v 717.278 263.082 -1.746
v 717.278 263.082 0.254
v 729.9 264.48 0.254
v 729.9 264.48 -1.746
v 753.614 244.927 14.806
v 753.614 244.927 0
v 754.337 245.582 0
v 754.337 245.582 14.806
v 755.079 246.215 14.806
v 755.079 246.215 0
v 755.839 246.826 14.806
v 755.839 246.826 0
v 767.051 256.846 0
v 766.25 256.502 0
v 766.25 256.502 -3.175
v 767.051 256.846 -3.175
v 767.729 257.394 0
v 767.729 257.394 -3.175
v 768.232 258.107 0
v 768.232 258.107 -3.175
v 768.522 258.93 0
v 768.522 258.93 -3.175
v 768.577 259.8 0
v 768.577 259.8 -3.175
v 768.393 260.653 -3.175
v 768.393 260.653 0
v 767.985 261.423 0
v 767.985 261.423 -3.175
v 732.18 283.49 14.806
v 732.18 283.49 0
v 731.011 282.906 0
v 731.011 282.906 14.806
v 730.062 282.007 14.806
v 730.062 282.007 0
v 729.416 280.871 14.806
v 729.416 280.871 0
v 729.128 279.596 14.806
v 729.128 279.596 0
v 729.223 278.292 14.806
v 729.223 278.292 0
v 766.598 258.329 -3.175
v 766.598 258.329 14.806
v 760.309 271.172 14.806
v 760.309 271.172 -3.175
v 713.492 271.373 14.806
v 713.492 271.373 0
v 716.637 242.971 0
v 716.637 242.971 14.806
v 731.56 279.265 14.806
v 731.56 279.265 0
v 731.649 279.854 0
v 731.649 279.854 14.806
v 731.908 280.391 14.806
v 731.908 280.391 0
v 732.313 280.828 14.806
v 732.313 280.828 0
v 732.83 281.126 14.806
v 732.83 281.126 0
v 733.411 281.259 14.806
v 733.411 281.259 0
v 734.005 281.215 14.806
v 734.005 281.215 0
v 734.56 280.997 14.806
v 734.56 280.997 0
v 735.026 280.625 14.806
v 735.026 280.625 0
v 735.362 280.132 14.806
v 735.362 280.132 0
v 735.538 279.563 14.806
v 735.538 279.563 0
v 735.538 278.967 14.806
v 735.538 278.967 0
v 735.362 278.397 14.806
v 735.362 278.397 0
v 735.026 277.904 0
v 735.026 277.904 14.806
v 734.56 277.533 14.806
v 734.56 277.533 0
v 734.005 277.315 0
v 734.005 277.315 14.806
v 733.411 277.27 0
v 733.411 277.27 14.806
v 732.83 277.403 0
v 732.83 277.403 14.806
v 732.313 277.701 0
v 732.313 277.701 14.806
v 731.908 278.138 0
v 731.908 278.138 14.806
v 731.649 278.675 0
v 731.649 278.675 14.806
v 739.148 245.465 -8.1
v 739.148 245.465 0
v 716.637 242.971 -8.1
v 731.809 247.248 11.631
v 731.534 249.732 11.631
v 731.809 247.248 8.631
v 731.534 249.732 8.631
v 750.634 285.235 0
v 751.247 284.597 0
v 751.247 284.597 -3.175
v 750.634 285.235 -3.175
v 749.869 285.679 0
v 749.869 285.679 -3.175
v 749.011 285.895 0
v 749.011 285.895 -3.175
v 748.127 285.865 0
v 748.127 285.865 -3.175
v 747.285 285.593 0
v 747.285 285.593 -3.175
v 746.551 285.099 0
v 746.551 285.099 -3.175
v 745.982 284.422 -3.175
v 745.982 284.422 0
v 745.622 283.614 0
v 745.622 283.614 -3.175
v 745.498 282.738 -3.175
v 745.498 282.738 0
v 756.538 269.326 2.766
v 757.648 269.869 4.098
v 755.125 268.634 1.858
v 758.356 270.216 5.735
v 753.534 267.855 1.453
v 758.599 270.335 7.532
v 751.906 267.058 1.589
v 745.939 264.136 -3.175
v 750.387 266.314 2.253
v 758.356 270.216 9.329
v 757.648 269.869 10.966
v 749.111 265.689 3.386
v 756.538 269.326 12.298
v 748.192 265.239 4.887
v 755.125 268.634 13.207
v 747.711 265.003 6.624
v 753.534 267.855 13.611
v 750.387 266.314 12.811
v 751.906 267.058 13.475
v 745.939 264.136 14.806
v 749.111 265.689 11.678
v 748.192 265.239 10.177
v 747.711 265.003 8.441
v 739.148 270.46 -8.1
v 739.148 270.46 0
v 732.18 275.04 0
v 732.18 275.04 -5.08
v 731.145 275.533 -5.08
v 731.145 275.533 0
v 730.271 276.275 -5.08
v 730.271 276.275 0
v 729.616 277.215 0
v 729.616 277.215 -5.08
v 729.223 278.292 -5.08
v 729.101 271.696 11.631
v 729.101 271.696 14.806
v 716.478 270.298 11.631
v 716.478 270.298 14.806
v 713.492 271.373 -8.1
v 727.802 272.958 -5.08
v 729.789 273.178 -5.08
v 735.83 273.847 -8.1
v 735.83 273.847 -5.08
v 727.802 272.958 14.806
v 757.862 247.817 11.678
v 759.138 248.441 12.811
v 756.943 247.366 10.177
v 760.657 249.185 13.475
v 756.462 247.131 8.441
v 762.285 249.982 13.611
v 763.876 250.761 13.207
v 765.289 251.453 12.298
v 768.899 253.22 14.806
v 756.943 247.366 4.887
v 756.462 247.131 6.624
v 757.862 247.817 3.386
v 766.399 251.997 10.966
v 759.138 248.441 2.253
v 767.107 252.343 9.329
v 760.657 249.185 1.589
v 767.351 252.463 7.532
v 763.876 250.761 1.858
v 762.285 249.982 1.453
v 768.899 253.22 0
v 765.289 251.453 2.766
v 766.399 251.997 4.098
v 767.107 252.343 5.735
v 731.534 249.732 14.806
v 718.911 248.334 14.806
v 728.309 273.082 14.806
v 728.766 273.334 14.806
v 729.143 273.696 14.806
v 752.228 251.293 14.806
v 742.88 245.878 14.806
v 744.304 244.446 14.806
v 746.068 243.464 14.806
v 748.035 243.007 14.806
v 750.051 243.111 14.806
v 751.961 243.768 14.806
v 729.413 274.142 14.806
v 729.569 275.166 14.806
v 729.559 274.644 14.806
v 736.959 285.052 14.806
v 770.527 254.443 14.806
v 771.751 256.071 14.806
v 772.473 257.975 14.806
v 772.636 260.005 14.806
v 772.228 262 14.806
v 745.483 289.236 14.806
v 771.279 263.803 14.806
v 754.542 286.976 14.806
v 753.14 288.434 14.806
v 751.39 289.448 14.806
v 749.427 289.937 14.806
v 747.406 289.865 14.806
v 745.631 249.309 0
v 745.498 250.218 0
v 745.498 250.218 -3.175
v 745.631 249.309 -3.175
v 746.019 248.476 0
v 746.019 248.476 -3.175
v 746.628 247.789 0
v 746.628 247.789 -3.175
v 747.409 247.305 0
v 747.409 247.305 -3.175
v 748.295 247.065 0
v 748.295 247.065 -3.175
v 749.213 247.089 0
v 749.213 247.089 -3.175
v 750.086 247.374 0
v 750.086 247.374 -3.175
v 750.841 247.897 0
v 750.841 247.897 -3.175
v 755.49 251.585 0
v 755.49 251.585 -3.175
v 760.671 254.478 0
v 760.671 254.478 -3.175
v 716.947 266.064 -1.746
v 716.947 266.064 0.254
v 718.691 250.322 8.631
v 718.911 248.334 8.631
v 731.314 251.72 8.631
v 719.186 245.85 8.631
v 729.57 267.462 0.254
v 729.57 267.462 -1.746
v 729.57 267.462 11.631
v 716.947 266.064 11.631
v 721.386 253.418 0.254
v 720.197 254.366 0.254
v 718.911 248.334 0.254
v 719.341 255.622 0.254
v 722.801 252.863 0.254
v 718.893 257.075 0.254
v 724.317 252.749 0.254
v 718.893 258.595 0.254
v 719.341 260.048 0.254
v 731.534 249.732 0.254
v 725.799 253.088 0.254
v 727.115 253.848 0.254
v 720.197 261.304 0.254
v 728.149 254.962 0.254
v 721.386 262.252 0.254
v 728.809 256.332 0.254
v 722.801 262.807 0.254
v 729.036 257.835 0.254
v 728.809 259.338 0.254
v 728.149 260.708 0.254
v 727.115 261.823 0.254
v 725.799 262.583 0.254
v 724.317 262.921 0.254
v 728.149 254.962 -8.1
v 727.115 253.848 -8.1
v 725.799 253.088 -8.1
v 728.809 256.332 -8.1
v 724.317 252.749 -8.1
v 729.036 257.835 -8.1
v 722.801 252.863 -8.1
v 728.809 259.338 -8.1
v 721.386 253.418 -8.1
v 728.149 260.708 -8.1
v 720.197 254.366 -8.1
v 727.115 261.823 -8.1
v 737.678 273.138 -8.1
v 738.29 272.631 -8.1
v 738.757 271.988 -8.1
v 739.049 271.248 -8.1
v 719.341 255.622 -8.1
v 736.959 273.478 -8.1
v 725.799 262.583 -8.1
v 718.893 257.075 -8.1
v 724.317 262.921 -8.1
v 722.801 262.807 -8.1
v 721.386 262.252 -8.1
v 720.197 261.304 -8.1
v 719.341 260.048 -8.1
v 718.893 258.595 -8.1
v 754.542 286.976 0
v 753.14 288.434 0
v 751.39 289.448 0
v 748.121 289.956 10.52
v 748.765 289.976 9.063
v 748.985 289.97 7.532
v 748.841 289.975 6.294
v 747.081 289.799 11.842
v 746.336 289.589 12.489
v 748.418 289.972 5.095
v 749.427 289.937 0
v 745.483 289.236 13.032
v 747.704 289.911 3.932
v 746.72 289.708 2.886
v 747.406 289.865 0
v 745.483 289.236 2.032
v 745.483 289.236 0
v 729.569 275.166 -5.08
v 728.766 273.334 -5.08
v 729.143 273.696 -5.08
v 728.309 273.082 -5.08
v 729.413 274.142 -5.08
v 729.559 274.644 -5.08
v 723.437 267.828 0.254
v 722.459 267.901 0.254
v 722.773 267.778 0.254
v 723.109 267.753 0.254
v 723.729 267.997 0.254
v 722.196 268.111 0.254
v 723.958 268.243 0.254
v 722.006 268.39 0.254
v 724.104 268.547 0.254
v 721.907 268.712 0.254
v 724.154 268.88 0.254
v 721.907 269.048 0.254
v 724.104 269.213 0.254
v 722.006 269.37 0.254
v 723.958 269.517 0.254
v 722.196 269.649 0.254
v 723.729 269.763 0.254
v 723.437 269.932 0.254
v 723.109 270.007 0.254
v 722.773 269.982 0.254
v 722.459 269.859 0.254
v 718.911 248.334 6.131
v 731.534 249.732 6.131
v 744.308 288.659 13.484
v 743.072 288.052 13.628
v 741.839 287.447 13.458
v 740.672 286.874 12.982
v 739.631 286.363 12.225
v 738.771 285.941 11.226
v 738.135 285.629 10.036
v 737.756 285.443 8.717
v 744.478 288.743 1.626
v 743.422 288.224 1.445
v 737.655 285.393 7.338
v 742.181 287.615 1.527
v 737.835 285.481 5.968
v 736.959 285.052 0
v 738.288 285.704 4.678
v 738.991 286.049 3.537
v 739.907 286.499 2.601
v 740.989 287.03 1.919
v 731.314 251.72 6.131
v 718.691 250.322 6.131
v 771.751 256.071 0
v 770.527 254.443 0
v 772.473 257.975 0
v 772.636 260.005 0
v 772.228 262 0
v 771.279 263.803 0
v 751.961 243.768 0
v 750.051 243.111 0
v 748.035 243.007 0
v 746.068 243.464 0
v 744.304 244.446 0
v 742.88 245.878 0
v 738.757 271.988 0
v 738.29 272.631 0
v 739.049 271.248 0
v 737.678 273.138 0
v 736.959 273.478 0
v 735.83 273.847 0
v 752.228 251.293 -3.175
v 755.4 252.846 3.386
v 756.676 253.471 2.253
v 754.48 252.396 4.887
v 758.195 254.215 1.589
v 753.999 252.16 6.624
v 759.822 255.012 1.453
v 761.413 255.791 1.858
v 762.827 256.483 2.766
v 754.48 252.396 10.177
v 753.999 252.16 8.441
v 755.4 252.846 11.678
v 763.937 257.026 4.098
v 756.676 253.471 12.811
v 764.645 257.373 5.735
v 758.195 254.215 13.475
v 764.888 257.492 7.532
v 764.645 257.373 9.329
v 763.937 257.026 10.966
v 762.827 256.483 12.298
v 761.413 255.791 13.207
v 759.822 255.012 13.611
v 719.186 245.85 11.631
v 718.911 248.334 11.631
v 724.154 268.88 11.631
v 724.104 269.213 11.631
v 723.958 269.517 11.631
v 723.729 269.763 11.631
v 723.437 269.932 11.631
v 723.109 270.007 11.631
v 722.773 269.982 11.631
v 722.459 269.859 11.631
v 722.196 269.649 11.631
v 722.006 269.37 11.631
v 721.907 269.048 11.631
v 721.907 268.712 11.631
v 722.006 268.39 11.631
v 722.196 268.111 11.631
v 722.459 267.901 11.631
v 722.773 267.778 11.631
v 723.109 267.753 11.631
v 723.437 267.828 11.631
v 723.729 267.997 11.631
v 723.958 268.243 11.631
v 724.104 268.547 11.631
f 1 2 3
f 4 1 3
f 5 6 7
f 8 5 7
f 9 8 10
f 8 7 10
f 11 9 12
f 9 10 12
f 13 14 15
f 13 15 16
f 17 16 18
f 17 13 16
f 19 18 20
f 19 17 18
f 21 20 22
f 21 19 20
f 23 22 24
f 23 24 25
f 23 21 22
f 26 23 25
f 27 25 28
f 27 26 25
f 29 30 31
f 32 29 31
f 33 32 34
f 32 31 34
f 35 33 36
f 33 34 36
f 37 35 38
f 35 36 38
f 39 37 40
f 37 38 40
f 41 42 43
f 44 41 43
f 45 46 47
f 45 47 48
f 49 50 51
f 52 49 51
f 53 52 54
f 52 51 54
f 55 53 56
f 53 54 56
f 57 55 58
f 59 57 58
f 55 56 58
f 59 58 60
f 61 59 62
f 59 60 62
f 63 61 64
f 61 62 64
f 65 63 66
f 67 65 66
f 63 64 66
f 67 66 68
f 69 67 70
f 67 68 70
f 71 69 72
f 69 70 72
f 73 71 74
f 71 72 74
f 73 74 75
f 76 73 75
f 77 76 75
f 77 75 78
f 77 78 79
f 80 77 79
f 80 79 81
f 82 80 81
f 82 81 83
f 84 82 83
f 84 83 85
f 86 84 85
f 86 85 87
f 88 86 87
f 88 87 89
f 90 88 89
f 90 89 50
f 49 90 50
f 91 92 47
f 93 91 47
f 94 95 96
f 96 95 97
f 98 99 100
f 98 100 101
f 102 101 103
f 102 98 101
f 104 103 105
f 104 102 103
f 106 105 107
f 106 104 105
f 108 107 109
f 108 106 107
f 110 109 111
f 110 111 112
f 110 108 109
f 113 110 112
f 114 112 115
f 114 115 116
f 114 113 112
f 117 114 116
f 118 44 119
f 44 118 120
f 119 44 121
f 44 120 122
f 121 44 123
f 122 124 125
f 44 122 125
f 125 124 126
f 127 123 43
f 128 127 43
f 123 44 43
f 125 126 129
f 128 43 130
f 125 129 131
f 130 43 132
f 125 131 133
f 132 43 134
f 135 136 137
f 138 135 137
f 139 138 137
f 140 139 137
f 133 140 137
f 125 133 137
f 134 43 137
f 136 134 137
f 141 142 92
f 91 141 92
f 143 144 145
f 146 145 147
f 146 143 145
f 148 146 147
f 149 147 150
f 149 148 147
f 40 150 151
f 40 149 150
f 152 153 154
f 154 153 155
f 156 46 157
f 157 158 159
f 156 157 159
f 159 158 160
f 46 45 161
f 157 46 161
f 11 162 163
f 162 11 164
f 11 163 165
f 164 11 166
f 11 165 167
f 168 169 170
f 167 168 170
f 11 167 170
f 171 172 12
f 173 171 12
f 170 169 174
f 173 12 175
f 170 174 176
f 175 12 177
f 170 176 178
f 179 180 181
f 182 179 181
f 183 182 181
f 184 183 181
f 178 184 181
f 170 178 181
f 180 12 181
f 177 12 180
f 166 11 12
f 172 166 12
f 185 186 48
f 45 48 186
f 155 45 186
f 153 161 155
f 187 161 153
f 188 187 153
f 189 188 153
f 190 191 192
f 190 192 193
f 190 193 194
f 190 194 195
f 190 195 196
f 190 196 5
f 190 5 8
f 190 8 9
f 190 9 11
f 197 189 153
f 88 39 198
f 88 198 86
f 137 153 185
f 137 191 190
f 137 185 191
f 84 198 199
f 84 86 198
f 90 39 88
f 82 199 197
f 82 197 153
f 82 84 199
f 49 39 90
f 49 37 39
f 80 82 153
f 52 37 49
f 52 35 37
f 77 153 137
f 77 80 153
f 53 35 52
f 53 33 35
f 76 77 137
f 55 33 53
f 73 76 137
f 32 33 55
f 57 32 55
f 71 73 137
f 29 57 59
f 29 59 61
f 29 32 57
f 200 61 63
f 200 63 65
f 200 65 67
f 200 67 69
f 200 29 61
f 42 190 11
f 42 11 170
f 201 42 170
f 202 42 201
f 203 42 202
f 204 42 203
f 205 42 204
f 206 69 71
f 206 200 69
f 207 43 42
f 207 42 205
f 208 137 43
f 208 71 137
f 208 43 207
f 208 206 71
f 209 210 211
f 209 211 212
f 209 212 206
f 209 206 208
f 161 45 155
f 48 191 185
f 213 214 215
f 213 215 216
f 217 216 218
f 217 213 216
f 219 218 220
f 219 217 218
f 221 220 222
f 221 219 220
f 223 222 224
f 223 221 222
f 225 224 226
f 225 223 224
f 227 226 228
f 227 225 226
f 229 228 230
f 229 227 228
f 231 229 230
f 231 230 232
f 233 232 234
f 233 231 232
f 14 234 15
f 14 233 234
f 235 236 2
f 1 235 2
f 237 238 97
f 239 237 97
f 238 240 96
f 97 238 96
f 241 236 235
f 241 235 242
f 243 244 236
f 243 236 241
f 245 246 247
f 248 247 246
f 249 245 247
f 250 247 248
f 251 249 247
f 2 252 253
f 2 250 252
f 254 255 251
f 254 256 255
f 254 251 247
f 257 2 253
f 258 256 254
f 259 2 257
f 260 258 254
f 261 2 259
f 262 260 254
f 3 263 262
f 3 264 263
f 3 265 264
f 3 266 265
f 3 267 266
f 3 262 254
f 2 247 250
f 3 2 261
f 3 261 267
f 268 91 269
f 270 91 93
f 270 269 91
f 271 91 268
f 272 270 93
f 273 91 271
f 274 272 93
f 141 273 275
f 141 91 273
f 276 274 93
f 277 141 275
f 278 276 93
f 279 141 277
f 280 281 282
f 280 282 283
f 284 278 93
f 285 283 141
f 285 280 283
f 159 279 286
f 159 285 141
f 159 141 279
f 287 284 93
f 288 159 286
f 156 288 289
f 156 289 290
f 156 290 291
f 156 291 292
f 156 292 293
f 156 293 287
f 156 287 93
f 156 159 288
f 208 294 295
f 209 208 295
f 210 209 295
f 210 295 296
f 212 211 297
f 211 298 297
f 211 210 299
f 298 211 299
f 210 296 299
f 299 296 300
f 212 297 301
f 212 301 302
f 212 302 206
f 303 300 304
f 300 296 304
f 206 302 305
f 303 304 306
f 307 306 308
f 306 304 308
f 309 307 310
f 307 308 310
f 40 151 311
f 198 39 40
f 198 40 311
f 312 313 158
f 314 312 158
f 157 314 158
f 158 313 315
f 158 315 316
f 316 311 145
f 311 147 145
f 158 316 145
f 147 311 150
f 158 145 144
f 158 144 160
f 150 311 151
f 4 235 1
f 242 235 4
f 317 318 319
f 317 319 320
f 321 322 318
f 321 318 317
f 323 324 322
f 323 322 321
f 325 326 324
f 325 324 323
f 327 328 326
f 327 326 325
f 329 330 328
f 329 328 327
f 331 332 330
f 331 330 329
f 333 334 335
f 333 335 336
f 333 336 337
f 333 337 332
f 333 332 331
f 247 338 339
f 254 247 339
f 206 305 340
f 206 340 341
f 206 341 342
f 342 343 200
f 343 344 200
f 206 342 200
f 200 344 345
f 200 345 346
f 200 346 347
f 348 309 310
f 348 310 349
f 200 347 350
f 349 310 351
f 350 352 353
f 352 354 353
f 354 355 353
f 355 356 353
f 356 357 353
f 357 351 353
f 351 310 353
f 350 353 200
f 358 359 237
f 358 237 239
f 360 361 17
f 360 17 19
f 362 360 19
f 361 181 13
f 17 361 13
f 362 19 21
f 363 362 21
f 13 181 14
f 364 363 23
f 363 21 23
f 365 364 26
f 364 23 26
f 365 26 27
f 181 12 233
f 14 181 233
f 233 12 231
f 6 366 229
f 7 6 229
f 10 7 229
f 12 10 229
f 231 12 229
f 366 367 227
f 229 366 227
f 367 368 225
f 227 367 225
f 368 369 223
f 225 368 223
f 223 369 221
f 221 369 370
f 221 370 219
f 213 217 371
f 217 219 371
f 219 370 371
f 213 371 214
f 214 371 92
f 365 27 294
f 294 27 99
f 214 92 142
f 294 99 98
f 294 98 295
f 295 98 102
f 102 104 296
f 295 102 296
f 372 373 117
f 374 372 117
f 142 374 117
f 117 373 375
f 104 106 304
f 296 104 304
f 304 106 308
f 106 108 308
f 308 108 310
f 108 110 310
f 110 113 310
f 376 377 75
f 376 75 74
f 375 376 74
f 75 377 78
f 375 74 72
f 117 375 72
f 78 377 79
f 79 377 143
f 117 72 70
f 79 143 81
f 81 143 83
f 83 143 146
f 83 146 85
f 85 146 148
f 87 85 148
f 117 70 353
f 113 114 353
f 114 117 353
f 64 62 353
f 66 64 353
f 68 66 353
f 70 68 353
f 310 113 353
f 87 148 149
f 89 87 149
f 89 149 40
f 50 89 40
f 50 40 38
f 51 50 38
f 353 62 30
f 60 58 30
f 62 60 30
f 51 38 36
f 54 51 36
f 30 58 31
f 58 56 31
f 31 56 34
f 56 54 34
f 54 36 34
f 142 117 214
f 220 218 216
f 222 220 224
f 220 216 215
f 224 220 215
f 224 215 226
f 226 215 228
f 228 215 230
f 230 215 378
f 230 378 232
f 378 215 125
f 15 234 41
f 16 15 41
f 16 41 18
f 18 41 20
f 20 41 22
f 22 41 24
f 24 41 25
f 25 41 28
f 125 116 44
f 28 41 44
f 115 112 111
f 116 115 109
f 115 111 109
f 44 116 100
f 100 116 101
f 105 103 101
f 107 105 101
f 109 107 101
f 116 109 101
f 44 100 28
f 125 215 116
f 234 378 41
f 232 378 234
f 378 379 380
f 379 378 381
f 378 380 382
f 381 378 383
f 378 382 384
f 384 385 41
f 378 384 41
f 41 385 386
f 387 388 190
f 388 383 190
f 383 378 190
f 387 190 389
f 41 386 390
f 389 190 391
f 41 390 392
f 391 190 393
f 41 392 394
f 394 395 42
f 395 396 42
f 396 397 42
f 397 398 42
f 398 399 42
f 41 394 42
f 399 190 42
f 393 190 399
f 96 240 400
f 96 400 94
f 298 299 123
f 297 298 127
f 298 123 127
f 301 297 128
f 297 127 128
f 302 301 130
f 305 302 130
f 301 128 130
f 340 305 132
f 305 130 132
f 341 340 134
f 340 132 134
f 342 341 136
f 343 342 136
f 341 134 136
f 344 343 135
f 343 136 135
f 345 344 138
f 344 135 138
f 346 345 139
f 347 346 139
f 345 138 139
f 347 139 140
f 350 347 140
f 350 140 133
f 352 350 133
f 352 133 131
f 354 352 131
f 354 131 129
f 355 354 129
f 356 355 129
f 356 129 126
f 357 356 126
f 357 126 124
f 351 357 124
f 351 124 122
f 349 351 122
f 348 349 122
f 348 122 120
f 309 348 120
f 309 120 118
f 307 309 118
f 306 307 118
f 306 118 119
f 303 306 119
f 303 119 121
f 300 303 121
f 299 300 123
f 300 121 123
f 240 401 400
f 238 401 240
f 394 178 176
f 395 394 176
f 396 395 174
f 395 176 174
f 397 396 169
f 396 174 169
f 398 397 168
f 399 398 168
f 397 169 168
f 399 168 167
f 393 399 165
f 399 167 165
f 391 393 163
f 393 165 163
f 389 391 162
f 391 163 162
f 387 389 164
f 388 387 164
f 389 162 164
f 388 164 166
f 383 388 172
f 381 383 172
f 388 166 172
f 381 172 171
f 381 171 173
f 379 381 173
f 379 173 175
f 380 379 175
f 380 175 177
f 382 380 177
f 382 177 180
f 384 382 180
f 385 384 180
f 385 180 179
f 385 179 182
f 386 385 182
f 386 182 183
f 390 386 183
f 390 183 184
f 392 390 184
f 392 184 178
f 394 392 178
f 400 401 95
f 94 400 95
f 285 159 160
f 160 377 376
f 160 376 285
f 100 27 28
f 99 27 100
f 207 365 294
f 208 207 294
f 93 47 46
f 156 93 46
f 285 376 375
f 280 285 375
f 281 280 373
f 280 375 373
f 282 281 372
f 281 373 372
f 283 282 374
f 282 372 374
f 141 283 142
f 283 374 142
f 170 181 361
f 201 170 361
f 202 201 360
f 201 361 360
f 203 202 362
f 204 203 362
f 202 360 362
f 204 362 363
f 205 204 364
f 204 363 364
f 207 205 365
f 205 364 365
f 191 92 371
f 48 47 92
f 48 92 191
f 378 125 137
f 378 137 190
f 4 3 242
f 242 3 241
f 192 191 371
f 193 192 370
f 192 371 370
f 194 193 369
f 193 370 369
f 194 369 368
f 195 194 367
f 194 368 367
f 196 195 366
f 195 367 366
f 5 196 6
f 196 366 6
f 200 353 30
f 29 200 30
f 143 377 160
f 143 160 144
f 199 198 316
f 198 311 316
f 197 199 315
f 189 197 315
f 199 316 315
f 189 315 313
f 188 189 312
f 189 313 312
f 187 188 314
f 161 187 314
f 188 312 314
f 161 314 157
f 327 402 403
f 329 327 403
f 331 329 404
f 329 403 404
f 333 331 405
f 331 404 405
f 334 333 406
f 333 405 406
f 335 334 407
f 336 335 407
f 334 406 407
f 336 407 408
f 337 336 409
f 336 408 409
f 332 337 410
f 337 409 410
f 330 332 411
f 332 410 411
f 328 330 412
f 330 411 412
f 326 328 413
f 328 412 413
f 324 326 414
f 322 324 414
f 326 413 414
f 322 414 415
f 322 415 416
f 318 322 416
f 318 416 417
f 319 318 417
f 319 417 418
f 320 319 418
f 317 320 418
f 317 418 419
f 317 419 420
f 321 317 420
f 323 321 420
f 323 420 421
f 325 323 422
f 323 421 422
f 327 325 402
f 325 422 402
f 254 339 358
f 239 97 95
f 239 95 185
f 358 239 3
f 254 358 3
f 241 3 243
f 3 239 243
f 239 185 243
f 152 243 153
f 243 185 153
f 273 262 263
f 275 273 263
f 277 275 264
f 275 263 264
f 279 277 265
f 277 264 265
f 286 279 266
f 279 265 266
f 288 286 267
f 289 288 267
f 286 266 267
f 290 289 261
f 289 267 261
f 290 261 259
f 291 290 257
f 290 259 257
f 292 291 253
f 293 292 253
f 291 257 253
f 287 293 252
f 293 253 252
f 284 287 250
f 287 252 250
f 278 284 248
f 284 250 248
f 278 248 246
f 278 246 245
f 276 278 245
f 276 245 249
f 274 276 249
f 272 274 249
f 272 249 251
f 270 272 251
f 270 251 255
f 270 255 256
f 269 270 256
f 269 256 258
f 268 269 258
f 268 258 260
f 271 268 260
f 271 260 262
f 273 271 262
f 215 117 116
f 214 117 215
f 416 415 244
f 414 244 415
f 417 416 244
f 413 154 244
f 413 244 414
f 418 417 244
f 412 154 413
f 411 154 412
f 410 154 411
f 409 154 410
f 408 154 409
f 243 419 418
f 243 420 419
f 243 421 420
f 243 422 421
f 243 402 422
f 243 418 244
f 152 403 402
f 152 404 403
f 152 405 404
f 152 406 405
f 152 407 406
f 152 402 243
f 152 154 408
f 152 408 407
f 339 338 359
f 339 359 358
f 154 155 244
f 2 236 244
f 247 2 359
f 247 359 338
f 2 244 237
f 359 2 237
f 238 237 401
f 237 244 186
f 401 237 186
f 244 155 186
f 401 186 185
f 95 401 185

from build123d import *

# Parameters (mm, degrees)
BOSS_EXTRUDE1_DEPTH      = 15.06
BOSS_EXTRUDE2_DEPTH      = 3.175
SKETCH7_W                = 15.06
SKETCH7_H                = 28.575
BOSS_EXTRUDE3_DEPTH      = 25.4
BOSS_EXTRUDE3_DEPTH_BACK = 2.54
CUT_EXTRUDE1_START       = -0.254
CUT_EXTRUDE1_DEPTH       = 14.552
BOSS_EXTRUDE4_DEPTH      = 8.1
SKETCH8_R                = 5.1
CUT_EXTRUDE3_DEPTH       = 826.597233992
SKETCH15_R               = 6.096
CUT_EXTRUDE4_DEPTH       = 823.185140665
CUT_EXTRUDE6_DEPTH       = 0.254
SKETCH22_W               = 12.7
SKETCH22_H               = 3
CUT_EXTRUDE8_DEPTH       = 2.5
BOSS_EXTRUDE5_START      = -3.175
SKETCH23_R               = 1.13
BOSS_EXTRUDE5_DEPTH      = 11.377
CUT_EXTRUDE9_DEPTH       = 2
SKETCH25_W               = 12.7
SKETCH25_H               = 2.5
BOSS_EXTRUDE6_DEPTH      = 2
CUT_EXTRUDE11_DEPTH      = 826.590147754
BOSS_EXTRUDE7_DEPTH      = 19.886
FILLET1_R                = 2
SKETCH31_R               = 2
CUT_EXTRUDE12_DEPTH      = 826.405127723


with BuildPart() as part:
    # Sketch1 → Boss-Extrude1 (new body)
    with BuildSketch(Plane.XY):
        with BuildLine():
            ThreePointArc((768.898502001, 253.220496825), (772.473384001, 257.975032047), (771.279316377, 263.802517698))
            Line((771.279316377, 263.802517698), (754.541770866, 286.976250421))
            ThreePointArc((754.541770866, 286.976250421), (750.425558167, 289.761469174), (745.483441324, 289.235986934))
            Line((745.483441324, 289.235986934), (736.959388492, 285.051606769))
            Line((736.959388492, 285.051606769), (732.179744734, 283.489883627))
            ThreePointArc((732.179744734, 283.489883627), (729.115297933, 279.264699802), (732.179762843, 275.03952911))
            Line((732.179762843, 275.03952911), (736.959413295, 273.477826454))
            ThreePointArc((736.959413295, 273.477826454), (738.543478356, 272.323947498), (739.148316802, 270.459847389))
            Line((739.148316802, 270.459847389), (741.478441562, 249.420712606))
            ThreePointArc((741.478441562, 249.420712606), (746.159744473, 243.429023652), (753.614349117, 244.926956583))
            ThreePointArc((753.614349117, 244.926956583), (754.705448313, 245.901255726), (755.838945539, 246.825885552))
            Line((755.838945539, 246.825885552), (768.898502001, 253.220496825))
        make_face()
    extrude(amount=BOSS_EXTRUDE1_DEPTH)

    # Sketch1<4> → Boss-Extrude2 (add)
    with BuildSketch(Plane.XY):
        with BuildLine():
            Line((767.984780823, 261.422994326), (751.247235317, 284.596727042))
            ThreePointArc((751.247235317, 284.596727042), (747.696485062, 285.758701464), (745.498379419, 282.7377176))
            Line((745.498379419, 282.7377176), (745.498449109, 250.217566764))
            ThreePointArc((745.498449109, 250.217566764), (747.408500645, 247.30543855), (750.840510516, 247.897127523))
            ThreePointArc((750.840510516, 247.897127523), (758.022031433, 253.136086658), (766.249615232, 256.501766428))
            ThreePointArc((766.249615232, 256.501766428), (768.405251042, 258.508228422), (767.984780823, 261.422994326))
        make_face()
    extrude(amount=-BOSS_EXTRUDE2_DEPTH)

    # Sketch7 → Boss-Extrude3 (add, two sides)
    with BuildSketch(Plane(origin=(759.782778814, 84.147408332, 0), x_dir=(0, 0, 1), z_dir=(-0.9939228549686344, -0.11007887340901991, 0))) as boss_extrude3_sk:
        with Locations((7.53, 176.895767228)):
            Rectangle(SKETCH7_W, SKETCH7_H)
    extrude(amount=BOSS_EXTRUDE3_DEPTH)
    extrude(boss_extrude3_sk.sketch, amount=-BOSS_EXTRUDE3_DEPTH_BACK)

    # Sketch9 → Cut-Extrude1 (cut)
    with BuildSketch(Plane.XY.offset(15.06).offset(CUT_EXTRUDE1_START)):
        Polygon((731.533703152, 249.732332737), (729.101180207, 271.696039986), (716.478359949, 270.298038294), (718.910882894, 248.334331045), align=None)
    extrude(amount=-CUT_EXTRUDE1_DEPTH, mode=Mode.SUBTRACT)

    # Sketch11 → Boss-Extrude4 (add)
    with BuildSketch(Plane(origin=(0, 0, 0), x_dir=(-1, 0, 0), z_dir=(0, 0, -1))):
        with BuildLine():
            Line((-716.637403434, 242.971478152), (-713.491899626, 271.372823733))
            Line((-713.491899626, 271.372823733), (-735.830090144, 273.846821422))
            Line((-735.830090144, 273.846821422), (-736.959413295, 273.477826454))
            ThreePointArc((-736.959413295, 273.477826454), (-738.543478356, 272.323947498), (-739.148316802, 270.459847389))
            Line((-739.148316802, 270.459847389), (-739.148370366, 245.464611162))
            Line((-739.148370366, 245.464611162), (-716.637403434, 242.971478152))
        make_face()
    extrude(amount=BOSS_EXTRUDE4_DEPTH)

    # Sketch8 → Cut-Extrude3 (cut, through all)
    with BuildSketch(Plane.XY.offset(15.06)):
        with Locations((723.935575753, 257.835181621)):
            Circle(SKETCH8_R)
    extrude(amount=-CUT_EXTRUDE3_DEPTH, mode=Mode.SUBTRACT)

    # Sketch15 → Cut-Extrude4 (cut, through all)
    with BuildSketch(Plane(origin=(48.686517672, -99.431271016, 0), x_dir=(0.8981144857275971, 0.4397617201692911, 0), z_dir=(0.43976172016929105, -0.898114485727597, 0))):
        with Locations((794.095983967, 7.53212)):
            Circle(SKETCH15_R)
    extrude(amount=-CUT_EXTRUDE4_DEPTH, mode=Mode.SUBTRACT)

    # Sketch20 → Cut-Extrude6 (cut)
    with BuildSketch(Plane.XY.offset(15.06)):
        with BuildLine():
            Line((732.179762843, 275.03952911), (735.830090144, 273.846821422))
            Line((735.830090144, 273.846821422), (713.491899626, 271.372823733))
            Line((713.491899626, 271.372823733), (716.637403434, 242.971478152))
            Line((716.637403434, 242.971478152), (742.879500347, 245.877841005))
            ThreePointArc((742.879500347, 245.877841005), (748.034725116, 243.00680713), (753.614349117, 244.926956583))
            ThreePointArc((753.614349117, 244.926956583), (754.705448313, 245.901255726), (755.838945539, 246.825885552))
            Line((755.838945539, 246.825885552), (768.898502001, 253.220496825))
            ThreePointArc((768.898502001, 253.220496825), (772.473384001, 257.975032047), (771.279316377, 263.802517698))
            Line((771.279316377, 263.802517698), (754.541770866, 286.976250421))
            ThreePointArc((754.541770866, 286.976250421), (750.425558167, 289.761469174), (745.483441324, 289.235986934))
            Line((745.483441324, 289.235986934), (736.959388492, 285.051606769))
            Line((736.959388492, 285.051606769), (732.179744734, 283.489883627))
            ThreePointArc((732.179744734, 283.489883627), (729.115297933, 279.264699802), (732.179762843, 275.03952911))
        make_face()
        Polygon((718.910882894, 248.334331045), (731.533703152, 249.732332737), (729.101180207, 271.696039986), (716.478359949, 270.298038294), align=None, mode=Mode.SUBTRACT)
    extrude(amount=-CUT_EXTRUDE6_DEPTH, mode=Mode.SUBTRACT)


with BuildPart() as cut_extrude6_kept_piece:
    # of the separate pieces the step leaves, the one the design keeps (cut_extrude6_pieces_kept)
    add(part.part.solids().sort_by_distance((753.614349117, 244.926956583, 0))[0])

    # Sketch22 → Cut-Extrude8 (cut)
    with BuildSketch(Plane(origin=(-18.45893554, 166.669201308, 0), x_dir=(0.9939228549686345, 0.11007887340901987, 0), z_dir=(-0.11007887340901987, 0.9939228549686345, 0))):
        with Locations((748.228320584, -10.131)):
            Rectangle(SKETCH22_W, SKETCH22_H)
    extrude(amount=-CUT_EXTRUDE8_DEPTH, mode=Mode.SUBTRACT)

    # Sketch23 → Boss-Extrude5 (add)
    with BuildSketch(Plane.XY.offset(14.806).offset(BOSS_EXTRUDE5_START)):
        Polygon((716.94729595, 266.063926932), (729.570116208, 267.461928624), (729.101180207, 271.696039986), (716.478359949, 270.298038294), align=None)
        with Locations((723.024238078, 268.879983459)):
            Circle(SKETCH23_R, mode=Mode.SUBTRACT)
    extrude(amount=-BOSS_EXTRUDE5_DEPTH)

    # Sketch24 → Cut-Extrude9 (cut)
    with BuildSketch(Plane.XY.offset(0.254)):
        Polygon((716.94729595, 266.063926932), (717.27753257, 263.082158367), (729.900352828, 264.480160059), (729.570116208, 267.461928624), align=None)
    extrude(amount=-CUT_EXTRUDE9_DEPTH, mode=Mode.SUBTRACT)

    # Sketch25 → Boss-Extrude6 (add)
    with BuildSketch(Plane(origin=(-18.45893554, 166.669201308, 0), x_dir=(0.9939228549686345, 0.11007887340901987, 0), z_dir=(-0.11007887340901987, 0.9939228549686345, 0))):
        with Locations((748.228320584, -7.381)):
            Rectangle(SKETCH25_W, SKETCH25_H)
    extrude(amount=BOSS_EXTRUDE6_DEPTH)

    # Sketch29 → Cut-Extrude11 (cut, through all)
    with BuildSketch(Plane.XY.offset(14.806)):
        Polygon((752.228042412, 251.293092232), (766.597874183, 258.329279755), (760.309281585, 271.1723169), (745.939449813, 264.136129378), align=None)
    extrude(amount=-CUT_EXTRUDE11_DEPTH, mode=Mode.SUBTRACT)

    # Sketch30 → Boss-Extrude7 (add)
    with BuildSketch(Plane.XY.offset(14.806)):
        with BuildLine():
            Line((729.789433052, 273.177806997), (735.830090144, 273.846821422))
            Line((735.830090144, 273.846821422), (732.179762843, 275.03952911))
            ThreePointArc((732.179762843, 275.03952911), (730.271210596, 276.27473784), (729.223019165, 278.292064539))
            Line((729.223019165, 278.292064539), (729.789433052, 273.177806997))
        make_face()
    extrude(amount=-BOSS_EXTRUDE7_DEPTH)

    # Fillet1
    fillet1_edges = [cut_extrude6_kept_piece.edges().sort_by_distance(p)[0] for p in [
        (729.789433052, 273.177806997, 4.863),
    ]]
    fillet(fillet1_edges, radius=FILLET1_R)

    # Sketch31 → Cut-Extrude12 (cut, through all)
    with BuildSketch(Plane(origin=(0, 0, 0), x_dir=(-1, 0, 0), z_dir=(0, 0, -1))):
        with Locations((-733.560297933, 279.264709327)):
            Circle(SKETCH31_R)
    extrude(amount=-CUT_EXTRUDE12_DEPTH, mode=Mode.SUBTRACT)


solid = cut_extrude6_kept_piece.part
